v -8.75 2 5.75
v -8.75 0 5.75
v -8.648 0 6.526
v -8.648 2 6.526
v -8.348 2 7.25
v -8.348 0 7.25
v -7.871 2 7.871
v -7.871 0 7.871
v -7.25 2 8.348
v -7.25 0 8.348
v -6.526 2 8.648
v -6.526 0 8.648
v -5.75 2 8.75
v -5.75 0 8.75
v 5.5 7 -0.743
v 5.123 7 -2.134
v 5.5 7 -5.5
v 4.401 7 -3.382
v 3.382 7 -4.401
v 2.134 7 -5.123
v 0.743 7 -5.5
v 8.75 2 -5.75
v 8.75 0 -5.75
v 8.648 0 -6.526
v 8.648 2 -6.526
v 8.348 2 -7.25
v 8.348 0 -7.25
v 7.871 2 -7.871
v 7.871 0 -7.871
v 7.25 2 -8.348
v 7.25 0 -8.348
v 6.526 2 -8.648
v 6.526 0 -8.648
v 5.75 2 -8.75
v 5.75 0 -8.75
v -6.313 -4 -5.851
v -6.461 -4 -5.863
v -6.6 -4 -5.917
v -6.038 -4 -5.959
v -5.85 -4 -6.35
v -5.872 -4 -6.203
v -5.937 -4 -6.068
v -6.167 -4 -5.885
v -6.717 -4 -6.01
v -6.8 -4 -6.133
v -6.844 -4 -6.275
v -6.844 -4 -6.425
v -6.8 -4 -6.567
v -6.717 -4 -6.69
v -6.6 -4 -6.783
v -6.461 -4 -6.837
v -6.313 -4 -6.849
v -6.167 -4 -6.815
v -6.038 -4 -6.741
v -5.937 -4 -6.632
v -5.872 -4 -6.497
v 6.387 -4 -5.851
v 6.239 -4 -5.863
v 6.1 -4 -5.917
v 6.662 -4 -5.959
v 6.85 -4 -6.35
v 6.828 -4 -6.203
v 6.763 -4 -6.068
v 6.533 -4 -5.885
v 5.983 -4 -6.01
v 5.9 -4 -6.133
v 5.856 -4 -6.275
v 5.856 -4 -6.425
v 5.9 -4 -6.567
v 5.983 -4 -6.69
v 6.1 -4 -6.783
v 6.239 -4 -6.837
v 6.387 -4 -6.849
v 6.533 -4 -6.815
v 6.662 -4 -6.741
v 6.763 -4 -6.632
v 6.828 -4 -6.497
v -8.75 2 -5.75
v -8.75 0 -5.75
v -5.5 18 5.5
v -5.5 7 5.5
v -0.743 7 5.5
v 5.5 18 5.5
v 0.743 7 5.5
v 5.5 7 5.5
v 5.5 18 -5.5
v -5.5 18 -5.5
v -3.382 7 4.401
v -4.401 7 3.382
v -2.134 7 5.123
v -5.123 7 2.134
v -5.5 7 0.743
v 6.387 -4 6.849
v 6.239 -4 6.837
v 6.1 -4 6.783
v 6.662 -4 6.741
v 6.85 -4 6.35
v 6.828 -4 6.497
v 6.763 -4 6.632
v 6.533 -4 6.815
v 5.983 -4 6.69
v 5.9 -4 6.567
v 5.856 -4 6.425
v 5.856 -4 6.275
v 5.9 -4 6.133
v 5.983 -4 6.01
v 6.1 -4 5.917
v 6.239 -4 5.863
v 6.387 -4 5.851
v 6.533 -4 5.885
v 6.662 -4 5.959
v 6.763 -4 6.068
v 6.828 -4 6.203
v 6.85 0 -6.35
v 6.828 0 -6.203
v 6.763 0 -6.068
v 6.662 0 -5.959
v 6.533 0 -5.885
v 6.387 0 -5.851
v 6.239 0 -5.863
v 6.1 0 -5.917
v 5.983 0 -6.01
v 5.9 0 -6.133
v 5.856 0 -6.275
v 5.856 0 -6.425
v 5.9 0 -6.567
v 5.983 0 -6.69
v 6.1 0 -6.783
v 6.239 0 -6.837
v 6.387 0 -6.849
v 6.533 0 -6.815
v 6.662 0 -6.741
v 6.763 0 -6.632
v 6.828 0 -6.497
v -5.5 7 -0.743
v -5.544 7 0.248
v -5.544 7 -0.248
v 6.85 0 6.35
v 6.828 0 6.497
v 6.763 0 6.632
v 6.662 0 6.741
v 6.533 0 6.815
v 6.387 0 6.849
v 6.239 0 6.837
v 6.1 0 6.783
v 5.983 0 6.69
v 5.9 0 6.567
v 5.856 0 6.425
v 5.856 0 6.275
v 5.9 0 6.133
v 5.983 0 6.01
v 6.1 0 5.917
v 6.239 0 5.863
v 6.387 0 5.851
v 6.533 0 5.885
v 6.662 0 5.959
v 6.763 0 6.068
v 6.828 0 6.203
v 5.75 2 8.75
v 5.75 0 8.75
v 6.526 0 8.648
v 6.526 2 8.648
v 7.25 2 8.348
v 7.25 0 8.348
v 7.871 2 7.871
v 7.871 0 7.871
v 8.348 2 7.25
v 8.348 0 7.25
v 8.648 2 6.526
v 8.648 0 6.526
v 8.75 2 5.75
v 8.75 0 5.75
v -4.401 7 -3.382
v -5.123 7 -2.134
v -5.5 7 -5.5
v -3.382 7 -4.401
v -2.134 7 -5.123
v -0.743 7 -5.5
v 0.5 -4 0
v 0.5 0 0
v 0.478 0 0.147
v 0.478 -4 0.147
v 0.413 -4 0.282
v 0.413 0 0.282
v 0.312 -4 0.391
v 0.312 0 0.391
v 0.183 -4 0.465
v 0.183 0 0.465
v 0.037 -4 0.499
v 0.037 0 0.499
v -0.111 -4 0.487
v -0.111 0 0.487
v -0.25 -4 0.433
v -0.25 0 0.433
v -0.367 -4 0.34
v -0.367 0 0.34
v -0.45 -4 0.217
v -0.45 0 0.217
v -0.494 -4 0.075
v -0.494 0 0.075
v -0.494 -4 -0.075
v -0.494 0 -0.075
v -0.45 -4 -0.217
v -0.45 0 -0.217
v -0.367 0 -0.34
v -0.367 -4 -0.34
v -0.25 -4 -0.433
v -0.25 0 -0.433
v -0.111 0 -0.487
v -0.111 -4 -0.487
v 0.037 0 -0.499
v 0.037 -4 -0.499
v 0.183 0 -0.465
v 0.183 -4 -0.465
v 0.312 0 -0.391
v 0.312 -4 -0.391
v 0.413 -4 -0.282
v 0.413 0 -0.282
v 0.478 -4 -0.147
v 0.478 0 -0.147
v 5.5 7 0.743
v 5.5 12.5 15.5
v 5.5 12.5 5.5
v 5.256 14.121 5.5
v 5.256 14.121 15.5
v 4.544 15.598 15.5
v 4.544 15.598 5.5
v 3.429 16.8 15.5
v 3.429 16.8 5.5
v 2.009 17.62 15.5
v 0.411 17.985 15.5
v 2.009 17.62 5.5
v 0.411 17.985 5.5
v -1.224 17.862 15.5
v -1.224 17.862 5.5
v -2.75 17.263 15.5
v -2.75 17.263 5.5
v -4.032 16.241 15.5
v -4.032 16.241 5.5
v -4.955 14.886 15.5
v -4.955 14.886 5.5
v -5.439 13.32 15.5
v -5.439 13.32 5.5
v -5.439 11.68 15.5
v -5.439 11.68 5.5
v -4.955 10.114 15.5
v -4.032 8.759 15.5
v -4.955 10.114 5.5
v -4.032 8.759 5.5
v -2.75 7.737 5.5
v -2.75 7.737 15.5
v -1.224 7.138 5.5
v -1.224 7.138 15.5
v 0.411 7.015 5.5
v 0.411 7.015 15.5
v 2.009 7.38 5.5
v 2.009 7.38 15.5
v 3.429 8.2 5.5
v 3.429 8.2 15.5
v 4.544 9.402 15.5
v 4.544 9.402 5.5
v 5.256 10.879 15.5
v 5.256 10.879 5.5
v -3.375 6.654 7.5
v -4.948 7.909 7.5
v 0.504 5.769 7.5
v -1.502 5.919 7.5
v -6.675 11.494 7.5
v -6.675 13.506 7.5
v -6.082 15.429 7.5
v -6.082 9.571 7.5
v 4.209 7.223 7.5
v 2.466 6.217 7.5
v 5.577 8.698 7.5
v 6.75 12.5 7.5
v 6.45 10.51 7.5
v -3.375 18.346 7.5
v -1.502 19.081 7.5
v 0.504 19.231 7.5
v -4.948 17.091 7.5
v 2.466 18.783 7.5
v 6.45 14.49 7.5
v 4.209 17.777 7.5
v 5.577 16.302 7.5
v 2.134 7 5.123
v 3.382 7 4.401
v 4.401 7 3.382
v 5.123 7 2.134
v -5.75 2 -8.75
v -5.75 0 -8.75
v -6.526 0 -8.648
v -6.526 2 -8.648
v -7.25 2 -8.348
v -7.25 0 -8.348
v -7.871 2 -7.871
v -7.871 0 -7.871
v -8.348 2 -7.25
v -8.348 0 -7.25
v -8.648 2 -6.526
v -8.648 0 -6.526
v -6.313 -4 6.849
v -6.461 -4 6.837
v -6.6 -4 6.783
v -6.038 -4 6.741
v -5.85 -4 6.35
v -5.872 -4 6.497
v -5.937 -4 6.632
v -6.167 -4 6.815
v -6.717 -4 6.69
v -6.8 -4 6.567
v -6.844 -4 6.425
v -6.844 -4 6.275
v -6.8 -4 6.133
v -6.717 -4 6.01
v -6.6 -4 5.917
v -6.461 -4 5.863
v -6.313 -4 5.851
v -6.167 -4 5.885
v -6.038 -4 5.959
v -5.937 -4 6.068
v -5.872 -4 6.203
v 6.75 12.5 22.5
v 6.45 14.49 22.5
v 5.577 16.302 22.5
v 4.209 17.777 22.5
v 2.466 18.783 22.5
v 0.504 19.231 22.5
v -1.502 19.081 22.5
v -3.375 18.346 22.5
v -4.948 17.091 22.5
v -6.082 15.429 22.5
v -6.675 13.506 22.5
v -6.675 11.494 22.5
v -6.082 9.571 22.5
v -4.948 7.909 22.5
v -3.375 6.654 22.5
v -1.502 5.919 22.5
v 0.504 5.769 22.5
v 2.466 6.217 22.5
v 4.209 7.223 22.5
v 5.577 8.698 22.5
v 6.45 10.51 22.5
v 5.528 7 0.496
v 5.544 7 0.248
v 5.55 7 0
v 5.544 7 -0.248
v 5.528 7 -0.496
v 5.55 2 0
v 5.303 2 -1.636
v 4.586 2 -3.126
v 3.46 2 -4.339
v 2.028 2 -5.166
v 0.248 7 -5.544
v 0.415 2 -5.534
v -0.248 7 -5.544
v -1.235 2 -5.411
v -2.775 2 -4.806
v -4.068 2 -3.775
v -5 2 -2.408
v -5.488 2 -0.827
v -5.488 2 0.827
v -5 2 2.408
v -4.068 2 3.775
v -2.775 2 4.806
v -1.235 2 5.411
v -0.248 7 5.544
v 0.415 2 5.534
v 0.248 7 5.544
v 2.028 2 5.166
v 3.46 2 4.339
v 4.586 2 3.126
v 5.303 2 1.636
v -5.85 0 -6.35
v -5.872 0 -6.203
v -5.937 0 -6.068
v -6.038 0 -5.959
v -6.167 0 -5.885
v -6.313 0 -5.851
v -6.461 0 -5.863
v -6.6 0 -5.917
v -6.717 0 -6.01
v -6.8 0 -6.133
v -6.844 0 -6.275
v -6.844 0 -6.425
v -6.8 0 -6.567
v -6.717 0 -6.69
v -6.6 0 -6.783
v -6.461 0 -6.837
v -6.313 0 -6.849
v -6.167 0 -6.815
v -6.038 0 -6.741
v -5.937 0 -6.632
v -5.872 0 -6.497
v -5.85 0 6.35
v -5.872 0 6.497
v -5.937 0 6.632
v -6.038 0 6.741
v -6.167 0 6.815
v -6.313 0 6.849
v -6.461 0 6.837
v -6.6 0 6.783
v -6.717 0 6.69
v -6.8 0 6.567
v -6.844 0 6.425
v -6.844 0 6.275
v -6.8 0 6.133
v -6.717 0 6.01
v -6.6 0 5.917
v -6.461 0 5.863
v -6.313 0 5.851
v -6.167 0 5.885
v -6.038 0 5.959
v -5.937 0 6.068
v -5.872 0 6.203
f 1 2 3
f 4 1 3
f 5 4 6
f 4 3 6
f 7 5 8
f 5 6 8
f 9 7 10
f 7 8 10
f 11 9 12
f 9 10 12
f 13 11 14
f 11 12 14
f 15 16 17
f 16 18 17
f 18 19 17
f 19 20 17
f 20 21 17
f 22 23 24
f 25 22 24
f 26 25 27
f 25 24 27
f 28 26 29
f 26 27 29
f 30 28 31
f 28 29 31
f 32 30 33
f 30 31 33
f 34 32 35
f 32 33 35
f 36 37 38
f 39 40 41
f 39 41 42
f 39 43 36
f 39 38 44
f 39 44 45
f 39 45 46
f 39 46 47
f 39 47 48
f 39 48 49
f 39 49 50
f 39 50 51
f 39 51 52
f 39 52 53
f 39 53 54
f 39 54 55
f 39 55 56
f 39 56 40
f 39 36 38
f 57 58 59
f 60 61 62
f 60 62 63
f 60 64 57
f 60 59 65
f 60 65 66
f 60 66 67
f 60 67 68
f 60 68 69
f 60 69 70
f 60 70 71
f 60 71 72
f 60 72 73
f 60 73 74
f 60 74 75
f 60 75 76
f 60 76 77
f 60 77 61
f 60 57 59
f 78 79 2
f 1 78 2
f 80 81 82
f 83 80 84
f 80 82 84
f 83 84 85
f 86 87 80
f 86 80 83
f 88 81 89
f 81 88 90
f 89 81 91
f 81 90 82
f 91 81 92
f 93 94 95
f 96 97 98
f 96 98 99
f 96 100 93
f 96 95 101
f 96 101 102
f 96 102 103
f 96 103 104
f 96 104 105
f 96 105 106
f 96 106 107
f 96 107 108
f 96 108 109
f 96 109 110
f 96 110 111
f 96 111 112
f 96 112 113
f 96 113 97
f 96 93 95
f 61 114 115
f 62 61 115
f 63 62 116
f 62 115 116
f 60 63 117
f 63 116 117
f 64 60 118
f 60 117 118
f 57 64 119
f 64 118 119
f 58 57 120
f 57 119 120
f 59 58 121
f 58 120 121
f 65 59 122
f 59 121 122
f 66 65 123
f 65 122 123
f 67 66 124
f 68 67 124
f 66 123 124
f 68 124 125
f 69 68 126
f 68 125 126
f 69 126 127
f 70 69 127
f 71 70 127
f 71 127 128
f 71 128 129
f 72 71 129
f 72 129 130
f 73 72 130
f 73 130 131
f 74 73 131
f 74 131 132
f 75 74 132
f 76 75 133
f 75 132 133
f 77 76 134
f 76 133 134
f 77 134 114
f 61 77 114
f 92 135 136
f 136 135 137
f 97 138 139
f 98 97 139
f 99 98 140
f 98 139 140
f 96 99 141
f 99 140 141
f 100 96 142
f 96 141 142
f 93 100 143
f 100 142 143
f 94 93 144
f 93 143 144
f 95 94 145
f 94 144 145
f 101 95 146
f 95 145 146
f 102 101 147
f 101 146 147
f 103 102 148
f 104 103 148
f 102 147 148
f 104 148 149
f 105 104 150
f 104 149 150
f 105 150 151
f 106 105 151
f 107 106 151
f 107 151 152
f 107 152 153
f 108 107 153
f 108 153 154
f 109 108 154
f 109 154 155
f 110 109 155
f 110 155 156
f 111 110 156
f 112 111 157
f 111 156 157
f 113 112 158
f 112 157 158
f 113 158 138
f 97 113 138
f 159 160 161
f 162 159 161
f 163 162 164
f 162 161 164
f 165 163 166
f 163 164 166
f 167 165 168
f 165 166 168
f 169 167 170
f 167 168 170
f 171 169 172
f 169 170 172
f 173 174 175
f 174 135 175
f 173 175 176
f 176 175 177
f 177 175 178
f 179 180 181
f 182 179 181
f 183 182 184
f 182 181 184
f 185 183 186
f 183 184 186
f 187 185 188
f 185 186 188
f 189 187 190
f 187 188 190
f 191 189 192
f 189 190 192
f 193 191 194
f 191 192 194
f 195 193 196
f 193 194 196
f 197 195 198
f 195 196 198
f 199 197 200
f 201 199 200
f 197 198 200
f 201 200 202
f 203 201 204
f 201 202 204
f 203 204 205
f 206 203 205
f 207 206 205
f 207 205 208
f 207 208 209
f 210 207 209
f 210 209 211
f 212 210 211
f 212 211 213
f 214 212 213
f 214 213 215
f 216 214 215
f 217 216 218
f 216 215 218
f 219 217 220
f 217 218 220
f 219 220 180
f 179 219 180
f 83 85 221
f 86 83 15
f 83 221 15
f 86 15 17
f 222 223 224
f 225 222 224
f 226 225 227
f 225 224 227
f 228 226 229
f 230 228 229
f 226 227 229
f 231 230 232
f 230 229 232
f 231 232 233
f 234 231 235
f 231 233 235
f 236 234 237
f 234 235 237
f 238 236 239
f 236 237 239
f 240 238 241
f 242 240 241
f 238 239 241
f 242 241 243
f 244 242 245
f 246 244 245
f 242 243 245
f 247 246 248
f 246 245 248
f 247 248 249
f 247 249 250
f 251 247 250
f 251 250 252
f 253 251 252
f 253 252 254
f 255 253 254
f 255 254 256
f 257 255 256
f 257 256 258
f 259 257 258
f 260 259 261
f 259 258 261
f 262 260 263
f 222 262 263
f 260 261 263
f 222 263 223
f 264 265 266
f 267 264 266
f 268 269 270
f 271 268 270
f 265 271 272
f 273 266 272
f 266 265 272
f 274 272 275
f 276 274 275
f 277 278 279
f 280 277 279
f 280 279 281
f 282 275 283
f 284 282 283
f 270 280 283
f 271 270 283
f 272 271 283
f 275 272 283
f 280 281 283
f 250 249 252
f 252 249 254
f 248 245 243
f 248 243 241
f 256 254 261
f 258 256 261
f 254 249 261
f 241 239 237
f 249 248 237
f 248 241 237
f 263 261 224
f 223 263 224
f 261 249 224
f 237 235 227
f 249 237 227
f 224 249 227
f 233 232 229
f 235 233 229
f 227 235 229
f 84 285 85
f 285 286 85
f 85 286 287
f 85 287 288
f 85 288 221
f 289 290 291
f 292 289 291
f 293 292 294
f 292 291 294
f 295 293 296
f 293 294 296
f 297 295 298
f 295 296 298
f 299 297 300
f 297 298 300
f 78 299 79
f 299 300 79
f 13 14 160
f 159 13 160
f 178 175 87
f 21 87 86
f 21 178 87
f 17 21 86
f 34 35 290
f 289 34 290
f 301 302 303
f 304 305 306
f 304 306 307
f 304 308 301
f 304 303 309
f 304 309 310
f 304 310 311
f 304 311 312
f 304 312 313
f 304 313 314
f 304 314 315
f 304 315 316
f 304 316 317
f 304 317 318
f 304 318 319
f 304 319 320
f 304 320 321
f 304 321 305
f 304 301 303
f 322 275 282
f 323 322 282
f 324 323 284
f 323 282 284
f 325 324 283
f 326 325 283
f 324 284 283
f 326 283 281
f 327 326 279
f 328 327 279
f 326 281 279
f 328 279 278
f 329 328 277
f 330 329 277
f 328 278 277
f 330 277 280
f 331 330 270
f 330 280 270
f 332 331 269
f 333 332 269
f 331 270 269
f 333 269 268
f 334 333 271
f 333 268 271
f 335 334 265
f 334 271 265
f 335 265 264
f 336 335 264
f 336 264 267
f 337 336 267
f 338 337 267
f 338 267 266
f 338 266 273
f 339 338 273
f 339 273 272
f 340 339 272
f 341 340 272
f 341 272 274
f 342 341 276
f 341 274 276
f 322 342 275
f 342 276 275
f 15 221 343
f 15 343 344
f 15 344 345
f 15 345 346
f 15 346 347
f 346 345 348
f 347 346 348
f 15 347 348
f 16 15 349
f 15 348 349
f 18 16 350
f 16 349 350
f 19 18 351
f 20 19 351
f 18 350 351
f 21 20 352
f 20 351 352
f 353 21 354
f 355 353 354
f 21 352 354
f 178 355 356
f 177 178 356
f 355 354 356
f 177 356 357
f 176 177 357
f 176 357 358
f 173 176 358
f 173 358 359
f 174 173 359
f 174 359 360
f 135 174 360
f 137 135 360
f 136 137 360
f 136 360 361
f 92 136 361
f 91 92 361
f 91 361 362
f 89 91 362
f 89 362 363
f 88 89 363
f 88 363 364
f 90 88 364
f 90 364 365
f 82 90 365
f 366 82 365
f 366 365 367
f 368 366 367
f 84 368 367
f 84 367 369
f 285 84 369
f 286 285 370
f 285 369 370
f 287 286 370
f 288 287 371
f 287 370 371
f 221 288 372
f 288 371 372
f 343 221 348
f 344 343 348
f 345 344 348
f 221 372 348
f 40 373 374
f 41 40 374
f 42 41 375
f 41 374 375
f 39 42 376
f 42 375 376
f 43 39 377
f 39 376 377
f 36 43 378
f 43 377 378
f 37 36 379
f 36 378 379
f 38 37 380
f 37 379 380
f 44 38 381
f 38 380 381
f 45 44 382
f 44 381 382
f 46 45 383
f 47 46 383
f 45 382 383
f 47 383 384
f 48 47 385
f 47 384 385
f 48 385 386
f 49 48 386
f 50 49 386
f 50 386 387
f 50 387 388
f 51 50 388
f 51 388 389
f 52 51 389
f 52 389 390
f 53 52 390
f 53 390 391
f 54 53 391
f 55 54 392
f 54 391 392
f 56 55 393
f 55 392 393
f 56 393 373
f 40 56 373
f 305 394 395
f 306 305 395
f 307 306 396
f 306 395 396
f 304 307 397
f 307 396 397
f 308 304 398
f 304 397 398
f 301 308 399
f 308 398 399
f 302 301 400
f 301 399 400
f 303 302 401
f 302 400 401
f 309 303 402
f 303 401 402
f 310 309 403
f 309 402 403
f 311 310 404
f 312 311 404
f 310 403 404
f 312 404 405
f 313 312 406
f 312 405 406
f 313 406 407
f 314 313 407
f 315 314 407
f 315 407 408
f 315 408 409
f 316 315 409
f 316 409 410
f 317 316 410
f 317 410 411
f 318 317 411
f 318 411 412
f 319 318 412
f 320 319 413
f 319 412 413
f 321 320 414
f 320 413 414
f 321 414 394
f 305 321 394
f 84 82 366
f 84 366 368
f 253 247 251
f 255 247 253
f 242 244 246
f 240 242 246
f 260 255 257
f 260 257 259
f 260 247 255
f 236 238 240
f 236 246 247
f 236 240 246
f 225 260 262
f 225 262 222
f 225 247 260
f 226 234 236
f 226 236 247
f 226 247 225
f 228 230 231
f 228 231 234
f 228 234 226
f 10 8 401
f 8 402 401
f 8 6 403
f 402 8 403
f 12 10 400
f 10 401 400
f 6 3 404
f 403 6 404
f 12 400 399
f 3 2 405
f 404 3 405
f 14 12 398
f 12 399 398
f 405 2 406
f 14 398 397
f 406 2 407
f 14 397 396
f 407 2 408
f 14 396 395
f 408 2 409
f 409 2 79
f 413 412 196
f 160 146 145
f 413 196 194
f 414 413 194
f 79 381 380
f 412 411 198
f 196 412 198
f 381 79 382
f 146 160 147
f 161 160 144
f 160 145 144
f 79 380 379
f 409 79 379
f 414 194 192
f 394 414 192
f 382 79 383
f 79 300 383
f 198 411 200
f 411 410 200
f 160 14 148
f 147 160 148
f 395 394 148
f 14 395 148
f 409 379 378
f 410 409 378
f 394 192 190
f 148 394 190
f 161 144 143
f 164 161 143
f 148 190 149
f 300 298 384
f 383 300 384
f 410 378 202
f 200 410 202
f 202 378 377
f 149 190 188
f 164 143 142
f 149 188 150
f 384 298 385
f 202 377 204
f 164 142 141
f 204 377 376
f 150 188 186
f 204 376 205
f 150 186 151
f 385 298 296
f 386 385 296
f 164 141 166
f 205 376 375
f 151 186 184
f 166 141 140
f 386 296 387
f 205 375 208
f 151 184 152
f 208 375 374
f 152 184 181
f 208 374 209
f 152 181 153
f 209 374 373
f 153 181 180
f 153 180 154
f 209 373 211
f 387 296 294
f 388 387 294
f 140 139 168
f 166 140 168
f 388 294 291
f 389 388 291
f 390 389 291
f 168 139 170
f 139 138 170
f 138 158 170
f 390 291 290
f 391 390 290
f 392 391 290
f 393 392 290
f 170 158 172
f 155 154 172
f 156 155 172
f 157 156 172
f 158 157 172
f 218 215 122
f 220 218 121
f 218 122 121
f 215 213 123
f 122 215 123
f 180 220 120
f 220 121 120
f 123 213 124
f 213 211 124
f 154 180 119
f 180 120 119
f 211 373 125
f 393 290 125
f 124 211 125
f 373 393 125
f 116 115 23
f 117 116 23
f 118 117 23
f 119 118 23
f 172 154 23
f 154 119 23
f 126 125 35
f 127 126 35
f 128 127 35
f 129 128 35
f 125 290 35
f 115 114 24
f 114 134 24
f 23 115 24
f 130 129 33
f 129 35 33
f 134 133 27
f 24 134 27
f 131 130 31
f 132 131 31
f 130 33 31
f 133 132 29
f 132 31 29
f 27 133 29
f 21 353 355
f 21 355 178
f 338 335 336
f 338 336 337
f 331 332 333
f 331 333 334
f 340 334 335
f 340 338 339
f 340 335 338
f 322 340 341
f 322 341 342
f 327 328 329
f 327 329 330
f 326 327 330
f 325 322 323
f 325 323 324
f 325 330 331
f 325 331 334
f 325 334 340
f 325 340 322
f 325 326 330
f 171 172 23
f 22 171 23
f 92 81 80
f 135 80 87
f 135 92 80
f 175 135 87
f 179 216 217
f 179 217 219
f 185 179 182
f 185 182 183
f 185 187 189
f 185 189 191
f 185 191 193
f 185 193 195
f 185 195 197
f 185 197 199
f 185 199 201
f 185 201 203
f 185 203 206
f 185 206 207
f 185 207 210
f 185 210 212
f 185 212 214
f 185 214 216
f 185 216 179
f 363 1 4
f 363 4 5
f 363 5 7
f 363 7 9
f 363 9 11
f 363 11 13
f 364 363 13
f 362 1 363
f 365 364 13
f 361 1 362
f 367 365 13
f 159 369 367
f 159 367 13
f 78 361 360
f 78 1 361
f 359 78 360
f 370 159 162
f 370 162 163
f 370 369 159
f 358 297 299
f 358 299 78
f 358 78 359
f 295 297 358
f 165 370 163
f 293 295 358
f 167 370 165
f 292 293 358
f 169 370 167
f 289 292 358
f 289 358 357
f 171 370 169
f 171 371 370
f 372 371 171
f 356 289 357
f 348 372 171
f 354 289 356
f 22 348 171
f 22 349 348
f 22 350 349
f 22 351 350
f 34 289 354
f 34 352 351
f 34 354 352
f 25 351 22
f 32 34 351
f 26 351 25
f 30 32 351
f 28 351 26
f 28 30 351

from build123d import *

# Parameters (mm, degrees)
AUFSATZ_LINEAR_AUSTRAGEN1_DEPTH = 2
SKIZZE2_R                       = 0.5
AUFSATZ_LINEAR_AUSTRAGEN2_DEPTH = 4
SKIZZE3_R                       = 5.55
AUFSATZ_LINEAR_AUSTRAGEN3_DEPTH = 5
SKIZZE4_W                       = 11
SKIZZE4_H                       = 11
AUFSATZ_LINEAR_AUSTRAGEN4_DEPTH = 11
SKIZZE5_R                       = 5.5
AUFSATZ_LINEAR_AUSTRAGEN6_DEPTH = 10
AUFSATZ_LINEAR_START            = 2
SKIZZE6_R                       = 6.75
AUFSATZ_LINEAR_AUSTRAGEN7_DEPTH = 15


with BuildPart() as part:
    # Skizze1 → Aufsatz-Linear austragen1 (new body)
    with BuildSketch(Plane(origin=(0, 0, 0), x_dir=(1, 0, 0), z_dir=(0, 1, 0))):
        with BuildLine():
            Line((-5.75, -8.75), (5.75, -8.75))
            ThreePointArc((5.75, -8.75), (7.871320344, -7.871320344), (8.75, -5.75))
            Line((8.75, -5.75), (8.75, 5.75))
            ThreePointArc((8.75, 5.75), (7.871320344, 7.871320344), (5.75, 8.75))
            Line((5.75, 8.75), (-5.75, 8.75))
            ThreePointArc((-5.75, 8.75), (-7.871320344, 7.871320344), (-8.75, 5.75))
            Line((-8.75, 5.75), (-8.75, -5.75))
            ThreePointArc((-8.75, -5.75), (-7.871320344, -7.871320344), (-5.75, -8.75))
        make_face()
    extrude(amount=AUFSATZ_LINEAR_AUSTRAGEN1_DEPTH)

    # Skizze2 → Aufsatz-Linear austragen2 (add)
    with BuildSketch(Plane.XZ):
        with Locations((6.35, -6.35)):
            Circle(SKIZZE2_R)
        with Locations((-6.35, 6.35)):
            Circle(SKIZZE2_R)
        with Locations((6.35, 6.35)):
            Circle(SKIZZE2_R)
        with Locations((-6.35, -6.35)):
            Circle(SKIZZE2_R)
        Circle(SKIZZE2_R)
    extrude(amount=AUFSATZ_LINEAR_AUSTRAGEN2_DEPTH)

    # Skizze3 → Aufsatz-Linear austragen3 (add)
    with BuildSketch(Plane(origin=(0, 2, 0), x_dir=(1, 0, 0), z_dir=(0, 1, 0))):
        Circle(SKIZZE3_R)
    extrude(amount=AUFSATZ_LINEAR_AUSTRAGEN3_DEPTH)

    # Skizze4 → Aufsatz-Linear austragen4 (add)
    with BuildSketch(Plane(origin=(0, 7, 0), x_dir=(1, 0, 0), z_dir=(0, 1, 0))):
        Rectangle(SKIZZE4_W, SKIZZE4_H)
    extrude(amount=AUFSATZ_LINEAR_AUSTRAGEN4_DEPTH)


with BuildPart() as body_2:
    # Skizze5 → Aufsatz-Linear austragen6 (new body)
    with BuildSketch(Plane.XY.offset(5.5)):
        with Locations((0, 12.5)):
            Circle(SKIZZE5_R)
    extrude(amount=AUFSATZ_LINEAR_AUSTRAGEN6_DEPTH)


with BuildPart() as body_3:
    # Skizze6 → Aufsatz-Linear austragen7 (new body)
    with BuildSketch(Plane.XY.offset(5.5).offset(AUFSATZ_LINEAR_START)):
        with Locations((0, 12.5)):
            Circle(SKIZZE6_R)
    extrude(amount=AUFSATZ_LINEAR_AUSTRAGEN7_DEPTH)


solid = Compound([part.part, body_2.part, body_3.part])
